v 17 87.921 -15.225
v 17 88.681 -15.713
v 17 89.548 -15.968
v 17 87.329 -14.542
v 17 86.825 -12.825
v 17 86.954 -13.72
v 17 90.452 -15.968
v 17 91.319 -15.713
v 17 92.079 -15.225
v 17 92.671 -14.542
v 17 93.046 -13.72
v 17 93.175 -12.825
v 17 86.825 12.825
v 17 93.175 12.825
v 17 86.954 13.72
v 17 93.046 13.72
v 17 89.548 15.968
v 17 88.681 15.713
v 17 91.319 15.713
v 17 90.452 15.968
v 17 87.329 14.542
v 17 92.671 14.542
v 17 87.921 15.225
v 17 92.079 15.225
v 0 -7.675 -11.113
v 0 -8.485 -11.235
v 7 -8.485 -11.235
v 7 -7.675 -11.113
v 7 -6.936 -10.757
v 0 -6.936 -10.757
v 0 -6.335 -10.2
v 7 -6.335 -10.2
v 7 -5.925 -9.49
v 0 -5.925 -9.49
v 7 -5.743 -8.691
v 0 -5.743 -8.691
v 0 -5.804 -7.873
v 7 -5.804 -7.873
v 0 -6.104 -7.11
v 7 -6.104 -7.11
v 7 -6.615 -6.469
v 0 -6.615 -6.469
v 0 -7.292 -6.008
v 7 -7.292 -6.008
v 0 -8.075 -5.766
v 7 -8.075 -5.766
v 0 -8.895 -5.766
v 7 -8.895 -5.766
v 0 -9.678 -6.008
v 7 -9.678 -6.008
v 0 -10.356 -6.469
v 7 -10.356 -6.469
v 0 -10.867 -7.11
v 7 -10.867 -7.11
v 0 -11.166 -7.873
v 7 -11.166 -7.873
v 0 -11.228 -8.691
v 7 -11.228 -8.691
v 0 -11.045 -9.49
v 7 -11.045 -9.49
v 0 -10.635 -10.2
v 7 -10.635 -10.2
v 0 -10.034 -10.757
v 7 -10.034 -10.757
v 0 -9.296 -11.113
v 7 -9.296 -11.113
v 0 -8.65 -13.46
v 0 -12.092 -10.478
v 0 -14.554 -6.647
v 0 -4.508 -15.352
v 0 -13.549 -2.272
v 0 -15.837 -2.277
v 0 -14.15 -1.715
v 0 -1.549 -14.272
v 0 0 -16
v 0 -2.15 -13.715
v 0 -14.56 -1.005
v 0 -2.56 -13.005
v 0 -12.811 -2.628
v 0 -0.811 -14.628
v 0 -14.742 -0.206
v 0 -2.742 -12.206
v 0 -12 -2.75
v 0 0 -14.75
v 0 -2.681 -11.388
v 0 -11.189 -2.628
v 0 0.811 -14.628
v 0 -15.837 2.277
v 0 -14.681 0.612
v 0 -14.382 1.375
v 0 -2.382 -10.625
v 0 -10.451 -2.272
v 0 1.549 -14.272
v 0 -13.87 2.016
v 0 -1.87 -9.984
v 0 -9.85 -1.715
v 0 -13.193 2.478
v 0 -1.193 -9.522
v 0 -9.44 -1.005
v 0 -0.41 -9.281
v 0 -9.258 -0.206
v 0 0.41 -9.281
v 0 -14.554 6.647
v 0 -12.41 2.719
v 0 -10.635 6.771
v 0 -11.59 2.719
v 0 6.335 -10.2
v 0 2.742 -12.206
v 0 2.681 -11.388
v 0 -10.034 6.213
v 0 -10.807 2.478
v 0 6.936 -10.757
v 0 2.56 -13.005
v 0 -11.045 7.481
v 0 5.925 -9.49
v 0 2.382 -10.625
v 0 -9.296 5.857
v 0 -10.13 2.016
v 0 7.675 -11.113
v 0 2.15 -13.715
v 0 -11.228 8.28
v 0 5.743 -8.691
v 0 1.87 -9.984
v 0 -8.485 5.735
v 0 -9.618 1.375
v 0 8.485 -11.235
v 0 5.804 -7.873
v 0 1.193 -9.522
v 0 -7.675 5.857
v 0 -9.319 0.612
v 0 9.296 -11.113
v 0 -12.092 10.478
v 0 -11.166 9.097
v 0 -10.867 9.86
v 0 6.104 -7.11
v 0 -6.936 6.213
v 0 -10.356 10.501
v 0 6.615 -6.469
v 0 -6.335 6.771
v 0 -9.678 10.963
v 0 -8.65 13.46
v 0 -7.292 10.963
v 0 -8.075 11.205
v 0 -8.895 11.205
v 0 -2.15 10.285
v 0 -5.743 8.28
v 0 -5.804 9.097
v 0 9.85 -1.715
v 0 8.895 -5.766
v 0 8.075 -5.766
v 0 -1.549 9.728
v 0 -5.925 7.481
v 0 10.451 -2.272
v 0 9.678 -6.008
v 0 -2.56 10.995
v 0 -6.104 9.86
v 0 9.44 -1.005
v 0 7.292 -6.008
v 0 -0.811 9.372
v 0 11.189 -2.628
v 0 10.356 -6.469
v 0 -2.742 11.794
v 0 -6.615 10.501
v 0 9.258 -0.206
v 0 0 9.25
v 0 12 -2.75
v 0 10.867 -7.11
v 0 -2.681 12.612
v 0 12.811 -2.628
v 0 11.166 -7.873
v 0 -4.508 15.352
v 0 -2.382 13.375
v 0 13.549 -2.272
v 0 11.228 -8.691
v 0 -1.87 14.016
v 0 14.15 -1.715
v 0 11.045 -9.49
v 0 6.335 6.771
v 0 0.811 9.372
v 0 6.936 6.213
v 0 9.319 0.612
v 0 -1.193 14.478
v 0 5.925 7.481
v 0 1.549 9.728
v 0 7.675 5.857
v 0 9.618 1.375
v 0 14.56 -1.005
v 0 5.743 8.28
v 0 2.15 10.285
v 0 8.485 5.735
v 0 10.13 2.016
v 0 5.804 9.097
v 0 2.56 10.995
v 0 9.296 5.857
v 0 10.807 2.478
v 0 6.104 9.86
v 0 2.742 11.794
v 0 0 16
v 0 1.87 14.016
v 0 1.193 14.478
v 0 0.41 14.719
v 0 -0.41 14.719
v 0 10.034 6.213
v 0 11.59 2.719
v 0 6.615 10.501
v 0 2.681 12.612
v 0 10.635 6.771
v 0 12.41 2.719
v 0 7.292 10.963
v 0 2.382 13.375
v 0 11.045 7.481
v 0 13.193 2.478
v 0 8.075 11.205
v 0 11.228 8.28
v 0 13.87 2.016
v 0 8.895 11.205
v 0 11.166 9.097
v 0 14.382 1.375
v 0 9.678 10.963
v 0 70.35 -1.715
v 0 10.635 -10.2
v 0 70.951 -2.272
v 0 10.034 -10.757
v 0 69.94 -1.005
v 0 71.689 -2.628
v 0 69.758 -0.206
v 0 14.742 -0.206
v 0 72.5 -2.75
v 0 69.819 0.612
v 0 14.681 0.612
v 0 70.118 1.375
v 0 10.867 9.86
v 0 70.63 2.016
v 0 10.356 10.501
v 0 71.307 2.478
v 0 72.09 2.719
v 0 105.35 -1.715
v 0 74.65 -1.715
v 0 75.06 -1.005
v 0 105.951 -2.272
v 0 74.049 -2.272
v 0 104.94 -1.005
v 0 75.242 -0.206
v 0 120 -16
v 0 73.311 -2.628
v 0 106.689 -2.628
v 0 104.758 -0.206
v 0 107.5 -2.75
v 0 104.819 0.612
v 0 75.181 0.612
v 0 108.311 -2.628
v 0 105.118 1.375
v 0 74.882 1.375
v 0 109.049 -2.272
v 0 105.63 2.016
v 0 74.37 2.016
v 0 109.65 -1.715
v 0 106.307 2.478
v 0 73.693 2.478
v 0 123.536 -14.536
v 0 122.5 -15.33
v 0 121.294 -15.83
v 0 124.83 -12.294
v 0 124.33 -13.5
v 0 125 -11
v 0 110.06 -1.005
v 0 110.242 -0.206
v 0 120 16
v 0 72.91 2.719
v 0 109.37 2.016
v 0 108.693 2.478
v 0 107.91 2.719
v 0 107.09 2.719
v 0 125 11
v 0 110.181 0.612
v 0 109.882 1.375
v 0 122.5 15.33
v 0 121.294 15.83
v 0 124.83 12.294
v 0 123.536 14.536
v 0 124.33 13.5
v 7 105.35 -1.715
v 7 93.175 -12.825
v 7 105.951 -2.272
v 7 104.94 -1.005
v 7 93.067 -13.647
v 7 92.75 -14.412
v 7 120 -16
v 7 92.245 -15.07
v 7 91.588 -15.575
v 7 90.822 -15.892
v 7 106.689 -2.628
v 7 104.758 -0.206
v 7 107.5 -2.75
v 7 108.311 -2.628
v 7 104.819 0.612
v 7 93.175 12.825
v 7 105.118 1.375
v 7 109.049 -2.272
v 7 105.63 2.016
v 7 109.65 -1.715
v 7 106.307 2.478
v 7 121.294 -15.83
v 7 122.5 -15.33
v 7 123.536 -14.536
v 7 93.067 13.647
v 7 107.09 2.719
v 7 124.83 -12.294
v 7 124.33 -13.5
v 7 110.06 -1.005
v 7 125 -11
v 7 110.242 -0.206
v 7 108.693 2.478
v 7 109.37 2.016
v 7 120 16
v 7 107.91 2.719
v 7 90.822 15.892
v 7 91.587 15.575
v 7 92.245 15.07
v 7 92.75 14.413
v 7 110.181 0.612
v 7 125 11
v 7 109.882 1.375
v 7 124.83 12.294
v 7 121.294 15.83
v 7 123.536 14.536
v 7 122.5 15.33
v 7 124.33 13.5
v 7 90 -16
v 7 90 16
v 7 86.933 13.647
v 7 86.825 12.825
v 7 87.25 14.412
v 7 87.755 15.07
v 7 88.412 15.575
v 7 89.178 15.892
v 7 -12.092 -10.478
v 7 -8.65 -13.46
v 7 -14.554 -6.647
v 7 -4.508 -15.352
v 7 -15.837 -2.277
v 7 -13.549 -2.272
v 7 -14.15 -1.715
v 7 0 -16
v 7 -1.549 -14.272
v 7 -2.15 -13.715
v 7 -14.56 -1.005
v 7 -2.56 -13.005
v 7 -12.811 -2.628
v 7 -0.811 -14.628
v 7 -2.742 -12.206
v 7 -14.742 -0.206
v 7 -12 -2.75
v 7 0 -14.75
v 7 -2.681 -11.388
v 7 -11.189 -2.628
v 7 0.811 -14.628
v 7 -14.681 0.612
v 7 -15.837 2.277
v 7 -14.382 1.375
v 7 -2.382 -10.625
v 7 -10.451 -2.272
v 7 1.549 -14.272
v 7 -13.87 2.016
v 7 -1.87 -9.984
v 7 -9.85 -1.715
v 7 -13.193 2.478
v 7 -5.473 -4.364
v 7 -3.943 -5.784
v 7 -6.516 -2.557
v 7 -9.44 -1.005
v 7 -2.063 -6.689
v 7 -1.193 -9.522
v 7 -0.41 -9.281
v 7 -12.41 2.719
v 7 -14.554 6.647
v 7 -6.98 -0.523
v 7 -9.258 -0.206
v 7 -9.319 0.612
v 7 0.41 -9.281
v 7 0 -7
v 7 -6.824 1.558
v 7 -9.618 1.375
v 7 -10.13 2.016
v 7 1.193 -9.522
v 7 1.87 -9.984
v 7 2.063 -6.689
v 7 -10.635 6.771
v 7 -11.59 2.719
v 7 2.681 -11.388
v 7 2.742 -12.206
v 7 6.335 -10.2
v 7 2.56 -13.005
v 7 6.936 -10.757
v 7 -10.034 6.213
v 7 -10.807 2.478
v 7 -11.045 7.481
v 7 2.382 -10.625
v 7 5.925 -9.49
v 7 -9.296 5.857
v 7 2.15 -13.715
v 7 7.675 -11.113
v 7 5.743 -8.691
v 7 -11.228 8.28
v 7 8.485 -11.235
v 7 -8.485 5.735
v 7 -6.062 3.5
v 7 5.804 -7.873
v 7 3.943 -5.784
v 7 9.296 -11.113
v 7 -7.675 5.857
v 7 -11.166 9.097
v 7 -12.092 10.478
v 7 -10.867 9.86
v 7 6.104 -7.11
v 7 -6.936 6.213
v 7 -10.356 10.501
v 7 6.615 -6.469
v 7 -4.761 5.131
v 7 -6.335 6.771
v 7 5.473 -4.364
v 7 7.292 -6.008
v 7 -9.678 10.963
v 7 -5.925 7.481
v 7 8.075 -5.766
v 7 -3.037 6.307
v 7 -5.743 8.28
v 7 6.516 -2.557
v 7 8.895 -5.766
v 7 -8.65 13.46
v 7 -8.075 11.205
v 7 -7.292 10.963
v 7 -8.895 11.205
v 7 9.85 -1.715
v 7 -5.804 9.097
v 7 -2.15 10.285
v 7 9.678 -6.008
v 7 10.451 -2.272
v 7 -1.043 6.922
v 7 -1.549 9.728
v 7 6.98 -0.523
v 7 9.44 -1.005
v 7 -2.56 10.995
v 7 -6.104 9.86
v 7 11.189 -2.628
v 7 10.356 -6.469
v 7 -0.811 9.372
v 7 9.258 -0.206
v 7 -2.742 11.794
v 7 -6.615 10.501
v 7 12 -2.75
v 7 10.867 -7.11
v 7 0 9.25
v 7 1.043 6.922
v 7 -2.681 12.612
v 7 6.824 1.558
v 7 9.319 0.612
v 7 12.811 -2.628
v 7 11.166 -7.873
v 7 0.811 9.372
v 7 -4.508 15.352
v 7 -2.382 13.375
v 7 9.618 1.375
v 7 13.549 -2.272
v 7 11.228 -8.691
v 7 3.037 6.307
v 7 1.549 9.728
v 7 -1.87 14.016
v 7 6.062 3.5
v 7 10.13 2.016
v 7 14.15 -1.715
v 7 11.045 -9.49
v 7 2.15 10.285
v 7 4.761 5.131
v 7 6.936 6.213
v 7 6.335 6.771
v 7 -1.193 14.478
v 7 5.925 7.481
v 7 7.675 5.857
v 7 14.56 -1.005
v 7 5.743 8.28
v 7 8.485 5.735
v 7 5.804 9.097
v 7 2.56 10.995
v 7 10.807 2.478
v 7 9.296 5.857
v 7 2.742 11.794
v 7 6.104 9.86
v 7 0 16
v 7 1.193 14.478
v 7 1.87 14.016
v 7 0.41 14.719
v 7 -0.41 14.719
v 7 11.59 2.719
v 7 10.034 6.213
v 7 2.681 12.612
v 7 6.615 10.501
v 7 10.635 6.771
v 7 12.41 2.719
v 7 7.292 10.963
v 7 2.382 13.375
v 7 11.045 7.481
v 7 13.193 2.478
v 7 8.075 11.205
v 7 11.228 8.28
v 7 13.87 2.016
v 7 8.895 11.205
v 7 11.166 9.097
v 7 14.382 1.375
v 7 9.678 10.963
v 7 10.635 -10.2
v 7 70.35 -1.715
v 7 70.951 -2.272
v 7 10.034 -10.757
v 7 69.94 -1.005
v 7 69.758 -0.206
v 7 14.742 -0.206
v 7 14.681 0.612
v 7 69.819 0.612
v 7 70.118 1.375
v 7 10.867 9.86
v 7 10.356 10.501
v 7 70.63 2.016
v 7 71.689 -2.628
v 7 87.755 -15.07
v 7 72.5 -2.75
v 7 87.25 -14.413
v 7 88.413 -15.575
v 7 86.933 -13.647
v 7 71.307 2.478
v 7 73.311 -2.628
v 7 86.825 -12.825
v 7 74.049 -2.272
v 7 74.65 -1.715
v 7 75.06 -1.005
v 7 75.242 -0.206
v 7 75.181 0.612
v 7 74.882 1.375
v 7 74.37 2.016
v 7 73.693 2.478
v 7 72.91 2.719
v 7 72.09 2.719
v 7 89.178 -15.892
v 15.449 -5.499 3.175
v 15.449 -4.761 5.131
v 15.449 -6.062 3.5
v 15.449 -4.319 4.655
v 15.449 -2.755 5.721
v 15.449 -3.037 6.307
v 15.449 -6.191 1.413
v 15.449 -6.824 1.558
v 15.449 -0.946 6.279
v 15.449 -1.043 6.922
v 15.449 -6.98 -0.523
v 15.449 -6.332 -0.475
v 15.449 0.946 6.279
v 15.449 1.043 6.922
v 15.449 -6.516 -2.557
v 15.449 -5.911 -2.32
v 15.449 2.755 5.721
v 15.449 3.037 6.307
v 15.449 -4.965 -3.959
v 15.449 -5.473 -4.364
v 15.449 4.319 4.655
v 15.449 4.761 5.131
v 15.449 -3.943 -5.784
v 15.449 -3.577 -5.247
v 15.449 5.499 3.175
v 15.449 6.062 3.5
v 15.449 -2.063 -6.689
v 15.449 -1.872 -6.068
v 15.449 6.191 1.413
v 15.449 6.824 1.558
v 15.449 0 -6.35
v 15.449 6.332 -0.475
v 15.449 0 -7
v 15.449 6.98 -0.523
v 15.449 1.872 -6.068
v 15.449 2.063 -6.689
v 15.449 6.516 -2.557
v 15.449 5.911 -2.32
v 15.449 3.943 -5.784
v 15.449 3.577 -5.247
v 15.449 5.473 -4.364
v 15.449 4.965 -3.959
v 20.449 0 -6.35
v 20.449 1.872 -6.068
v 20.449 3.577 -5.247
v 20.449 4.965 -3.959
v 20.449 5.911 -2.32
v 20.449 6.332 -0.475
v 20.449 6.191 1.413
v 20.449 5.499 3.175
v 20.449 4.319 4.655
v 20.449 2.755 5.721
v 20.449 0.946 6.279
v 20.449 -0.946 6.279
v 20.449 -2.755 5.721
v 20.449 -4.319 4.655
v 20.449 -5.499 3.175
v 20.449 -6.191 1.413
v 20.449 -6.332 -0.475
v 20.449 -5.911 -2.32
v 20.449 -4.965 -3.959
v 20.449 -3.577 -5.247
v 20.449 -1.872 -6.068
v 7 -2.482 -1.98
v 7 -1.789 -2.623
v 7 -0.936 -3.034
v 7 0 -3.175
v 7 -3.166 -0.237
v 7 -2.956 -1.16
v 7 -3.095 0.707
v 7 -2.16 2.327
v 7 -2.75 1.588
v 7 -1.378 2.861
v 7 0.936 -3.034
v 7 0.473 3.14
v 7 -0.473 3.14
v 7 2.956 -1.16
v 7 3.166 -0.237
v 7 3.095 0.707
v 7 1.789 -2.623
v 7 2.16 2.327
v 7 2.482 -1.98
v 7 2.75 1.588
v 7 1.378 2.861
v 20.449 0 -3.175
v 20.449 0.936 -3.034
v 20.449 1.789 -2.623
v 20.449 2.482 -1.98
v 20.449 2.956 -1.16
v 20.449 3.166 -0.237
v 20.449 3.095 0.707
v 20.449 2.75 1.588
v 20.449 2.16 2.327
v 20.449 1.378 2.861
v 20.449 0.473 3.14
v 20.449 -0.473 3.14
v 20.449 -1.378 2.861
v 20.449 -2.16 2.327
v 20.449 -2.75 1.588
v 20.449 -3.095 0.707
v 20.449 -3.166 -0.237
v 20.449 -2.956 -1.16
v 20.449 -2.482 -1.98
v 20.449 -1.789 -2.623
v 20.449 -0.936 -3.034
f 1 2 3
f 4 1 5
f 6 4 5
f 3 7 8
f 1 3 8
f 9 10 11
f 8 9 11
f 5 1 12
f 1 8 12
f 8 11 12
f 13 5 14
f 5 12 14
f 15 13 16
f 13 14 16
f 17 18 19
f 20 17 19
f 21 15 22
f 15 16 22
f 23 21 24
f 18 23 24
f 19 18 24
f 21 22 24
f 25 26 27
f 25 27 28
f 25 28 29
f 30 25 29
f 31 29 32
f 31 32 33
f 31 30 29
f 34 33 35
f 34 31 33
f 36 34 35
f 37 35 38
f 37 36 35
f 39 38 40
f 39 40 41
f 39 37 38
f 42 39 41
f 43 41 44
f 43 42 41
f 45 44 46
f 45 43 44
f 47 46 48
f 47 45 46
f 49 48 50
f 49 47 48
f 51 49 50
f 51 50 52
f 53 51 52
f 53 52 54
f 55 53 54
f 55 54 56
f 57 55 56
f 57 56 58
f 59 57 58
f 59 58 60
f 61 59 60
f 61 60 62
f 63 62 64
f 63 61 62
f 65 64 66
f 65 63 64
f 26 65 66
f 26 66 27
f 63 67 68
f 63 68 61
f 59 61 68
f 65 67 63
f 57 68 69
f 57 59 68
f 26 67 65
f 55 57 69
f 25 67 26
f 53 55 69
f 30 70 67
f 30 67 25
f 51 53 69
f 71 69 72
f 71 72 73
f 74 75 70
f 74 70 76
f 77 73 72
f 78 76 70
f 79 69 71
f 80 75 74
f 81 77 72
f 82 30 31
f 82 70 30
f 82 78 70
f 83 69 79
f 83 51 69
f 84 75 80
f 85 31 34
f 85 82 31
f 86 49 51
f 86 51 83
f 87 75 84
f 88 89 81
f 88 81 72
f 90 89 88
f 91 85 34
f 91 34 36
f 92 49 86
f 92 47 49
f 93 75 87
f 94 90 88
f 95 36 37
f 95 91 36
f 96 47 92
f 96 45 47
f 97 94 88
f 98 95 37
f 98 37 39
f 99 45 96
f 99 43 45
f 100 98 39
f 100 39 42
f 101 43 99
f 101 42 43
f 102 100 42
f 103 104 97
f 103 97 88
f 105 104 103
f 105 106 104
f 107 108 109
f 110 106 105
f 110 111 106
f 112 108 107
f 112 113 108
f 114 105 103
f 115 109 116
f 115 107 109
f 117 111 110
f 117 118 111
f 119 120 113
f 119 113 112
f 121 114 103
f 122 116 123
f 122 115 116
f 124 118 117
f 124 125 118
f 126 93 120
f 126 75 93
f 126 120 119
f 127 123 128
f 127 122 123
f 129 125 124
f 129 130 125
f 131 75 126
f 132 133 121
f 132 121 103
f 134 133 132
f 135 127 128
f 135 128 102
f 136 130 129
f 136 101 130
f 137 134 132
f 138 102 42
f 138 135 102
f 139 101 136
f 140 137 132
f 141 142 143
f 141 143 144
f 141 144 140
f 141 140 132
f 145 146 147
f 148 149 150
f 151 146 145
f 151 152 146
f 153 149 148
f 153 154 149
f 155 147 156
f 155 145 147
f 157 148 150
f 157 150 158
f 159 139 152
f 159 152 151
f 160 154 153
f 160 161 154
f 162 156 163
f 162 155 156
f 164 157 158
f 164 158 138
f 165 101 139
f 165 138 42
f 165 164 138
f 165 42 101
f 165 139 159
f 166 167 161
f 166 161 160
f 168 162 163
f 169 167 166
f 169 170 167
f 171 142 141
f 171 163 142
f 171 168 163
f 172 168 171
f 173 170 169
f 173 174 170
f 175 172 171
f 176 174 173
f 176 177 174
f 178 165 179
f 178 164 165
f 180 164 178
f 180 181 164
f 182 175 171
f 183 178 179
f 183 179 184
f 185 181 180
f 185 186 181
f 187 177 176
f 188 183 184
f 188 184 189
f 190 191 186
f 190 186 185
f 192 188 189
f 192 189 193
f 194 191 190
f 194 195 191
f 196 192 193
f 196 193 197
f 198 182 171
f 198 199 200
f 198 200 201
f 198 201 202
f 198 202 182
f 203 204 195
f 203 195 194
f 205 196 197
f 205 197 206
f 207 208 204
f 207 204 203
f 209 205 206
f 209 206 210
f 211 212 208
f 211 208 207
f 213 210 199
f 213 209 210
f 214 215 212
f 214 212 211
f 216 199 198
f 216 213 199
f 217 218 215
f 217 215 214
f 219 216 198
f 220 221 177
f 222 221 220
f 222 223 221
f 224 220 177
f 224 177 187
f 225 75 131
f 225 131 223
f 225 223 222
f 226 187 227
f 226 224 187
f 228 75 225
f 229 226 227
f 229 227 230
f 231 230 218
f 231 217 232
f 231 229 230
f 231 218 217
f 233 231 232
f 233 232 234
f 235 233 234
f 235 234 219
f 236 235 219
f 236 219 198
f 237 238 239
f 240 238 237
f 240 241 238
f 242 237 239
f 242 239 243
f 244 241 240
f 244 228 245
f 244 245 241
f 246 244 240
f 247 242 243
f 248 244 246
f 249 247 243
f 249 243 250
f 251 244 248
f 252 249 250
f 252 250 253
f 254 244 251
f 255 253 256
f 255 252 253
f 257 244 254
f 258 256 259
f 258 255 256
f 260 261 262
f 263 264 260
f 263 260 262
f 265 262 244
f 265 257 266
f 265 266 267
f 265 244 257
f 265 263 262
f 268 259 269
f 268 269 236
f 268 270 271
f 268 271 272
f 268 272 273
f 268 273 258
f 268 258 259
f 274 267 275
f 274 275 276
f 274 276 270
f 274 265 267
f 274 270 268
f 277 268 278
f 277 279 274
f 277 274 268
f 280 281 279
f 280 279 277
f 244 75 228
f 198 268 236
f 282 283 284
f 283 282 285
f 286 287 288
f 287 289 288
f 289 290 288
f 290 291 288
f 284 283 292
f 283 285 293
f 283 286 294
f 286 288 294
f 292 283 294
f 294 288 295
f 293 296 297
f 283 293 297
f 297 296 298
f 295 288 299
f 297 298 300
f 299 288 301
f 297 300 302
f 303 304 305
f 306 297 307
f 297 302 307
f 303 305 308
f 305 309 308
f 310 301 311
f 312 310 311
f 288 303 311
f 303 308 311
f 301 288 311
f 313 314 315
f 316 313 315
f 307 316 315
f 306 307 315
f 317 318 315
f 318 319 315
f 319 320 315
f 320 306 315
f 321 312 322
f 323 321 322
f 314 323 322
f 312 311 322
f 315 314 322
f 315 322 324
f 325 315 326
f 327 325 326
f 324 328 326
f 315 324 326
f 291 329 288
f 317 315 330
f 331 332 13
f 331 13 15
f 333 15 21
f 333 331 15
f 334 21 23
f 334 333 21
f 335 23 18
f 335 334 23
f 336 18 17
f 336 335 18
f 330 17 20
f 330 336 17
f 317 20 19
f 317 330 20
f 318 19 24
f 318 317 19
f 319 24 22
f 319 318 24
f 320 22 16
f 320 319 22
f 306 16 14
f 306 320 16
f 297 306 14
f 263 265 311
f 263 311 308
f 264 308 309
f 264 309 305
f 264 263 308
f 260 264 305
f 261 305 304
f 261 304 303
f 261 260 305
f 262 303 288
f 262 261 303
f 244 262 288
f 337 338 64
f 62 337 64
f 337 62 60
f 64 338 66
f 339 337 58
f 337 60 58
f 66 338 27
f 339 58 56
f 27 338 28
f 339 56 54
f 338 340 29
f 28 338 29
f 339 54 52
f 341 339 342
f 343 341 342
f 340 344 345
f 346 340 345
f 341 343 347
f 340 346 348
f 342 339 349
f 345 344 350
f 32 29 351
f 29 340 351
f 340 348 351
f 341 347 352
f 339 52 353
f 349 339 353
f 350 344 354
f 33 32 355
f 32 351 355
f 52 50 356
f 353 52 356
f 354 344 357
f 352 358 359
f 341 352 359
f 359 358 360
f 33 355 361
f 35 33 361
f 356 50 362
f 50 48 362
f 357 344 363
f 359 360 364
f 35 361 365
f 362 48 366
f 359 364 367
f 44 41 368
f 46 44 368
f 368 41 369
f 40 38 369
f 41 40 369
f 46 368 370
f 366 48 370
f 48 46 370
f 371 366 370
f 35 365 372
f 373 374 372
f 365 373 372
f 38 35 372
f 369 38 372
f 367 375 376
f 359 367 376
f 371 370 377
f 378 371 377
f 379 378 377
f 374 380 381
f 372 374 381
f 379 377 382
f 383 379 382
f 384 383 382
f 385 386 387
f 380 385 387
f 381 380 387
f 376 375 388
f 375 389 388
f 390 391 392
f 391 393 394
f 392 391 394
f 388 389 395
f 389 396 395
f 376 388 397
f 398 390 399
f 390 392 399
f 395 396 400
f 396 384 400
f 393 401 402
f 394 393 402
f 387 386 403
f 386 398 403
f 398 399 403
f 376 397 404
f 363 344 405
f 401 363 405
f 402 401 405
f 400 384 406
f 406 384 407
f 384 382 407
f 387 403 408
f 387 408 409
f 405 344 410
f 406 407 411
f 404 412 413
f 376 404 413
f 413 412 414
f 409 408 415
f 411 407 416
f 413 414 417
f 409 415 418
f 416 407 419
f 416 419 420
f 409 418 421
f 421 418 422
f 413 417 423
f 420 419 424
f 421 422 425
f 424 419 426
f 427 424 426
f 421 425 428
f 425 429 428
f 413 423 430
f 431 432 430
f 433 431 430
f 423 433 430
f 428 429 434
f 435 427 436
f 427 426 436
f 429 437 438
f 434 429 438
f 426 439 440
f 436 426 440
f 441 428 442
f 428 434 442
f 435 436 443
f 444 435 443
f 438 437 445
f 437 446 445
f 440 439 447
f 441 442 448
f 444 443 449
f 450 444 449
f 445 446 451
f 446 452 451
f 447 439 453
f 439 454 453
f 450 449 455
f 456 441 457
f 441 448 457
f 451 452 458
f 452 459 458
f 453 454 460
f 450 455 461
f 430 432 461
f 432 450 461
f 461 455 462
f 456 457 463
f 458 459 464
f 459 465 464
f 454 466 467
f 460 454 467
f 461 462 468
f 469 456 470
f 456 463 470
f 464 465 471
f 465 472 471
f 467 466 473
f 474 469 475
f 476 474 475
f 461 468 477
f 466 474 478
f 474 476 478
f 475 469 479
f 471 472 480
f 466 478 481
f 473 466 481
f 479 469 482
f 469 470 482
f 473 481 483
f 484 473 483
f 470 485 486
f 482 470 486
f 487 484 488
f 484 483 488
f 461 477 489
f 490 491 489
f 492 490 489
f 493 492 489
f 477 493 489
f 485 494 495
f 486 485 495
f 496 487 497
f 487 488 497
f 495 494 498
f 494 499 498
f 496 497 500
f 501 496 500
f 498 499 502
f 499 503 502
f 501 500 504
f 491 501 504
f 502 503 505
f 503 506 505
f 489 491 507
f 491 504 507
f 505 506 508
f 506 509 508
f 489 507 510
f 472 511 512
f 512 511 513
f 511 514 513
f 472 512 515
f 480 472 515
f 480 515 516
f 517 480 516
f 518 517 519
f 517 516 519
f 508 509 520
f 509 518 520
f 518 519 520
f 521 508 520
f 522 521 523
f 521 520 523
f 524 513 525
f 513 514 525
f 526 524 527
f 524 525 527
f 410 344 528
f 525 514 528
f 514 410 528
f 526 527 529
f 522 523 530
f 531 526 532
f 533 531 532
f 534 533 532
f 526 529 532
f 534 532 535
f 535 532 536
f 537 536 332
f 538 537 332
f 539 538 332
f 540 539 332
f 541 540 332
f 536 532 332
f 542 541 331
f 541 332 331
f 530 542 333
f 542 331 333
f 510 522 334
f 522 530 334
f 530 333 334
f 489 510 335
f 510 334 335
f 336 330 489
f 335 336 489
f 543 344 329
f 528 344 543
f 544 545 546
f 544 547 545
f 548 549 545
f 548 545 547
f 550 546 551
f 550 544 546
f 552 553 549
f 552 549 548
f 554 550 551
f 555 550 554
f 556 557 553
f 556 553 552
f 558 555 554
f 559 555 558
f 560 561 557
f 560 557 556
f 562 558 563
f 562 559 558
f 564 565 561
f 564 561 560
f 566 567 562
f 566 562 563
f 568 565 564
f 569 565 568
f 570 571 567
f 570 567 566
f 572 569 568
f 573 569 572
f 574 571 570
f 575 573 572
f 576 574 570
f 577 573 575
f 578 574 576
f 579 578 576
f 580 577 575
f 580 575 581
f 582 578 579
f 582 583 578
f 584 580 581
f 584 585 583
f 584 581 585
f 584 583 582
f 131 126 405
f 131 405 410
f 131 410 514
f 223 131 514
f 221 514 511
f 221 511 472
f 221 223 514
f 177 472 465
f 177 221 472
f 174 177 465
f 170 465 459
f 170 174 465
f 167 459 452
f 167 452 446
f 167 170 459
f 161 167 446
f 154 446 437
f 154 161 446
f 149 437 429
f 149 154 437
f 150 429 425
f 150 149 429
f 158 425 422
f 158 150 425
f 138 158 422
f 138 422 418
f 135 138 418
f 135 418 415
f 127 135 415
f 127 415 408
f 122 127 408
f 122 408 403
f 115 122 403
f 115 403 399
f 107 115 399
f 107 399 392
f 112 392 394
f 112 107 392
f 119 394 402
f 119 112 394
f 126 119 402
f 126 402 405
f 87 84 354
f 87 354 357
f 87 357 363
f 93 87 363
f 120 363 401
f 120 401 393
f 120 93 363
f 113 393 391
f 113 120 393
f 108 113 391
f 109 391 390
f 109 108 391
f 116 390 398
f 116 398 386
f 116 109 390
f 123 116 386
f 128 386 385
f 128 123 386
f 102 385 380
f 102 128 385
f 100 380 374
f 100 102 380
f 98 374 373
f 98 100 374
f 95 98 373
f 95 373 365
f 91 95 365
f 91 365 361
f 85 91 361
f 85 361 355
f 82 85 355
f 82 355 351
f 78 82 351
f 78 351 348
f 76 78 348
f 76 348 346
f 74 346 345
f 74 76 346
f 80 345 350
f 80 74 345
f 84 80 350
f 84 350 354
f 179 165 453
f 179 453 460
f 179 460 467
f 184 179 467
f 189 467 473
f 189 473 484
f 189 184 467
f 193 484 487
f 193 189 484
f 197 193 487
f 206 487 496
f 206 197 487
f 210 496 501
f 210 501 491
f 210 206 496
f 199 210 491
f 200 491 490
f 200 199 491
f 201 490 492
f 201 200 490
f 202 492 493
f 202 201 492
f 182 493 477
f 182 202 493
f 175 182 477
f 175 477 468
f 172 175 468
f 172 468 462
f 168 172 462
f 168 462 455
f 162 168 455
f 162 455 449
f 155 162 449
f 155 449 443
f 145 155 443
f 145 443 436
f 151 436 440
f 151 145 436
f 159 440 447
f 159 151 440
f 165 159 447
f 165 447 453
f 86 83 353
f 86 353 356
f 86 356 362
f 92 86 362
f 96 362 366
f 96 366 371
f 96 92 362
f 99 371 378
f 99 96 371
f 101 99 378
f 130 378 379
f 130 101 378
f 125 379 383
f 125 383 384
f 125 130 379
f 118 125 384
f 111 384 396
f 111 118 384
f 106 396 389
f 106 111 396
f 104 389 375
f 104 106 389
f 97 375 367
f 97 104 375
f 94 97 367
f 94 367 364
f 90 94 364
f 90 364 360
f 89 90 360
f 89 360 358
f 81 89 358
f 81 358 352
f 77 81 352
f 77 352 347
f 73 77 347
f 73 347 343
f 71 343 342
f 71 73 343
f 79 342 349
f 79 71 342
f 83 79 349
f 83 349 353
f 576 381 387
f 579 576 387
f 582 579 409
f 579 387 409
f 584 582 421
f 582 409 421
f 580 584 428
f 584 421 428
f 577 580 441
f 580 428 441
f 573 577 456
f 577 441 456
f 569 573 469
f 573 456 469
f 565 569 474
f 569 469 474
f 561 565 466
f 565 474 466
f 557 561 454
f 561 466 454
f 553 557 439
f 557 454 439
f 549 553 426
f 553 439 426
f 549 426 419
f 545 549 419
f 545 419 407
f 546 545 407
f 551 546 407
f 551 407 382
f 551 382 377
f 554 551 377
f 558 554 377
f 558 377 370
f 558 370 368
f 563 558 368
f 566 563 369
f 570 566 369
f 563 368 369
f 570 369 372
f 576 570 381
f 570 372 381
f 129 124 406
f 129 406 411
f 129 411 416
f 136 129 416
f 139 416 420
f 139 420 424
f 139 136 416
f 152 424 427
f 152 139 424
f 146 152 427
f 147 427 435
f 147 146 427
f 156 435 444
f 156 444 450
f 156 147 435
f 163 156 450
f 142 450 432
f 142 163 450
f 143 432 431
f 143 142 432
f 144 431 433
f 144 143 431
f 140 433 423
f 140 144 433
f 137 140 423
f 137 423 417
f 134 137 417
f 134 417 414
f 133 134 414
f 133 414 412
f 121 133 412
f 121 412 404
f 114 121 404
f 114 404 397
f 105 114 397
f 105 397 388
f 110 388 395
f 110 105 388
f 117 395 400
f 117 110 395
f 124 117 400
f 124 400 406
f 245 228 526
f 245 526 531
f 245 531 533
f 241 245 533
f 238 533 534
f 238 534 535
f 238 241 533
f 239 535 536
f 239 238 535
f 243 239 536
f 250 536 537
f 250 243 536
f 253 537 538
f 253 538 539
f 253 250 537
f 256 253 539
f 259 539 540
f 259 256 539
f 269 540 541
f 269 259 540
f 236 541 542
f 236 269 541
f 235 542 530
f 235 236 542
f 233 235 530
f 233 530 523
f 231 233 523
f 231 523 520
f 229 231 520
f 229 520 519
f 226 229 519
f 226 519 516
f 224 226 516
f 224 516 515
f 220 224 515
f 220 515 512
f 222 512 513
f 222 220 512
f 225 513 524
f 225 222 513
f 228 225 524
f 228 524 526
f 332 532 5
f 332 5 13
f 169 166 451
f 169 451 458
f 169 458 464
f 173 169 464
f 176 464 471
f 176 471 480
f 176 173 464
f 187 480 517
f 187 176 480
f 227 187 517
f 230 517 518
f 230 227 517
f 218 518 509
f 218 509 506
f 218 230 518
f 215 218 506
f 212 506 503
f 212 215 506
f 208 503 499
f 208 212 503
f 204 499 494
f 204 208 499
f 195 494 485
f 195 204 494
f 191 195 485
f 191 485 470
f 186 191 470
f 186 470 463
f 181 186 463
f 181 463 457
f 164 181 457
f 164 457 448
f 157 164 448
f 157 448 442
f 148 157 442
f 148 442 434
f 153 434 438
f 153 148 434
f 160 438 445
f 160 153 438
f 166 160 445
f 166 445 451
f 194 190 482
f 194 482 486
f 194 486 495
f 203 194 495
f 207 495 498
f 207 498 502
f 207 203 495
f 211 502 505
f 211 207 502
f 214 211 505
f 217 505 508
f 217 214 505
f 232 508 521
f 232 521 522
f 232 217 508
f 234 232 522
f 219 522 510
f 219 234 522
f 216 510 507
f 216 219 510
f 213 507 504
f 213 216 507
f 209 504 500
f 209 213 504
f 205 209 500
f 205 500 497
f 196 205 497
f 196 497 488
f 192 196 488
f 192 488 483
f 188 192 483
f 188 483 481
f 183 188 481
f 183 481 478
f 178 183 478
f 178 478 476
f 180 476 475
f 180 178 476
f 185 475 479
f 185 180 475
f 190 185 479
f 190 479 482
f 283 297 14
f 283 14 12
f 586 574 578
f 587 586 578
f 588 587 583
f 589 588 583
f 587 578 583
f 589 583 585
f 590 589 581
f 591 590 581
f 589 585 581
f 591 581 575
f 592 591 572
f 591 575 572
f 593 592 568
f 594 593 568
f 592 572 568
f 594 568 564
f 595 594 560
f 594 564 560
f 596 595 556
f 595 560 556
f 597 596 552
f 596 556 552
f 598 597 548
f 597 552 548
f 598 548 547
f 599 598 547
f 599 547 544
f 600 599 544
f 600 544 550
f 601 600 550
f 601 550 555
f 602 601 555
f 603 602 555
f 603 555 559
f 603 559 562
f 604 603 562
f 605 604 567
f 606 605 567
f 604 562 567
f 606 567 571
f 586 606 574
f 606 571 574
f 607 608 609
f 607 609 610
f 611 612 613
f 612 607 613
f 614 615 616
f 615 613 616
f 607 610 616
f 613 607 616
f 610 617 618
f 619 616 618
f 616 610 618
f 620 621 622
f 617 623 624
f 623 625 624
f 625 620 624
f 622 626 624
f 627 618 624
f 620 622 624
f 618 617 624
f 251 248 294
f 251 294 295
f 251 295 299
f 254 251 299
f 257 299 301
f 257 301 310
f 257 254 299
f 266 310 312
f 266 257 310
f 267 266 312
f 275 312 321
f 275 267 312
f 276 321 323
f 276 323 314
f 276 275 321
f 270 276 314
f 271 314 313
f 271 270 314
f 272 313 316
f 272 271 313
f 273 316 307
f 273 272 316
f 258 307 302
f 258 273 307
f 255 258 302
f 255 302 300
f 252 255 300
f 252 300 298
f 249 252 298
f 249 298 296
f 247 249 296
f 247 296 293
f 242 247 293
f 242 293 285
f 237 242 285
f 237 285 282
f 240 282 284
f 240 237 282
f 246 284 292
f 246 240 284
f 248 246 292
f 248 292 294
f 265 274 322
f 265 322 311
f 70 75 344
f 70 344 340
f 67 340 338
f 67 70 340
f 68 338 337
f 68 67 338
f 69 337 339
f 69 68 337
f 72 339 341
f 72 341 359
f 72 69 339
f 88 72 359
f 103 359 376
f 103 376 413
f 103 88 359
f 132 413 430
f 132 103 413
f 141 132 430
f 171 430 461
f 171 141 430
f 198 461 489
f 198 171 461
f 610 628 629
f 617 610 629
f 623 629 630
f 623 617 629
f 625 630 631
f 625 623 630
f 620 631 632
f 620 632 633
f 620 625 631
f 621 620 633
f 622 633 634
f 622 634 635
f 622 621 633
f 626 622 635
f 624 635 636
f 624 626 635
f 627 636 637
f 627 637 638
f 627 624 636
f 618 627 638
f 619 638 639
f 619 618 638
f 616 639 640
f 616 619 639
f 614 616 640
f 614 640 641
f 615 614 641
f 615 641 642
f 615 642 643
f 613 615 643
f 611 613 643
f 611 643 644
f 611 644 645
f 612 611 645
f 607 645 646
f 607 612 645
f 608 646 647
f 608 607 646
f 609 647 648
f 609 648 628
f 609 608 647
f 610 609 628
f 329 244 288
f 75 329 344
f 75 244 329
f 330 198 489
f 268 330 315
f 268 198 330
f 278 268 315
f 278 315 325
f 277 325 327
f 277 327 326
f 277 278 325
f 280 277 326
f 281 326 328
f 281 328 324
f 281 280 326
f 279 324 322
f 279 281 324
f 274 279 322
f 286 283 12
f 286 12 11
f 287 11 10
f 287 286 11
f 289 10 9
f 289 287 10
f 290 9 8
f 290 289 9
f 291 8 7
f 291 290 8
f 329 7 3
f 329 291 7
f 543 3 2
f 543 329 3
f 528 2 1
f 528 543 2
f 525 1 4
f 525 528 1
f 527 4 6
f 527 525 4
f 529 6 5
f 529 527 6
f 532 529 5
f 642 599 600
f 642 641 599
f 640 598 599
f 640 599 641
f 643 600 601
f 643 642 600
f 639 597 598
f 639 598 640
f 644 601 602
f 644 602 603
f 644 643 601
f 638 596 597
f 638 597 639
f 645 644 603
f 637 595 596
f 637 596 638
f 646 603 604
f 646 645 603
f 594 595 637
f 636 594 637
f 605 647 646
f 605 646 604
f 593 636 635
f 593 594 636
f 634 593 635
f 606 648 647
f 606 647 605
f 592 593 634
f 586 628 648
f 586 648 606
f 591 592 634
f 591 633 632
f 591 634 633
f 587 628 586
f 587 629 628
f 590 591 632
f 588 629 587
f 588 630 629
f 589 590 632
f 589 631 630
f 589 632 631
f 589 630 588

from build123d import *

# Parameters (mm, degrees)
SKETCH1_R           = 2.7499945
SKETCH1_R_2         = 2.75
BOSS_EXTRUDE1_DEPTH = 7
SKETCH3_R           = 7
SKETCH3_R_2         = 3.175
BOSS_EXTRUDE2_DEPTH = 8.449
SKETCH6_R           = 6.35
SKETCH6_R_2         = 3.175
BOSS_EXTRUDE4_DEPTH = 5
BOSS_EXTRUDE5_DEPTH = 10


with BuildPart() as part:
    # Sketch1 → Boss-Extrude1 (new body)
    with BuildSketch(Plane(origin=(0, 0, 0), x_dir=(0, 0, -1), z_dir=(1, 0, 0))):
        with BuildLine():
            Line((-11, 125), (11, 125))
            ThreePointArc((11, 125), (14.535533906, 123.535533906), (16, 120))
            Line((16, 120), (16, 0))
            ThreePointArc((16, 0), (0, -16), (-16, 0))
            Line((-16, 0), (-16, 120))
            ThreePointArc((-16, 120), (-14.535533906, 123.535533906), (-11, 125))
        make_face()
        with Locations((0, 107.5)):
            Circle(SKETCH1_R, mode=Mode.SUBTRACT)
        with Locations((0, 72.5)):
            Circle(SKETCH1_R_2, mode=Mode.SUBTRACT)
        with Locations((0, 12)):
            Circle(SKETCH1_R_2, mode=Mode.SUBTRACT)
        with Locations((8.485281374, 8.485281374)):
            Circle(SKETCH1_R_2, mode=Mode.SUBTRACT)
        with Locations((12, 0)):
            Circle(SKETCH1_R_2, mode=Mode.SUBTRACT)
        with Locations((8.485281374, -8.485281374)):
            Circle(SKETCH1_R_2, mode=Mode.SUBTRACT)
        with Locations((0, -12)):
            Circle(SKETCH1_R_2, mode=Mode.SUBTRACT)
        with Locations((-8.485281374, -8.485281374)):
            Circle(SKETCH1_R_2, mode=Mode.SUBTRACT)
        with Locations((-12, 0)):
            Circle(SKETCH1_R_2, mode=Mode.SUBTRACT)
        with Locations((-8.485281374, 8.485281374)):
            Circle(SKETCH1_R_2, mode=Mode.SUBTRACT)
    extrude(amount=BOSS_EXTRUDE1_DEPTH)

    # Sketch3 → Boss-Extrude2 (add)
    with BuildSketch(Plane(origin=(7, 0, 0), x_dir=(0, 0, -1), z_dir=(1, 0, 0))):
        Circle(SKETCH3_R)
        Circle(SKETCH3_R_2, mode=Mode.SUBTRACT)
    extrude(amount=BOSS_EXTRUDE2_DEPTH)

    # Sketch6 → Boss-Extrude4 (add)
    with BuildSketch(Plane(origin=(15.449, 0, 0), x_dir=(0, 0, -1), z_dir=(1, 0, 0))):
        Circle(SKETCH6_R)
        Circle(SKETCH6_R_2, mode=Mode.SUBTRACT)
    extrude(amount=BOSS_EXTRUDE4_DEPTH)

    # Sketch7 → Boss-Extrude5 (add)
    with BuildSketch(Plane(origin=(7, 0, 0), x_dir=(0, 0, -1), z_dir=(1, 0, 0))):
        with BuildLine():
            Line((-12.825, 93.175), (12.825, 93.175))
            ThreePointArc((12.825, 93.175), (16, 90), (12.825, 86.825))
            Line((12.825, 86.825), (-12.825, 86.825))
            ThreePointArc((-12.825, 86.825), (-16, 90), (-12.825, 93.175))
        make_face()
    extrude(amount=BOSS_EXTRUDE5_DEPTH)


solid = part.part
